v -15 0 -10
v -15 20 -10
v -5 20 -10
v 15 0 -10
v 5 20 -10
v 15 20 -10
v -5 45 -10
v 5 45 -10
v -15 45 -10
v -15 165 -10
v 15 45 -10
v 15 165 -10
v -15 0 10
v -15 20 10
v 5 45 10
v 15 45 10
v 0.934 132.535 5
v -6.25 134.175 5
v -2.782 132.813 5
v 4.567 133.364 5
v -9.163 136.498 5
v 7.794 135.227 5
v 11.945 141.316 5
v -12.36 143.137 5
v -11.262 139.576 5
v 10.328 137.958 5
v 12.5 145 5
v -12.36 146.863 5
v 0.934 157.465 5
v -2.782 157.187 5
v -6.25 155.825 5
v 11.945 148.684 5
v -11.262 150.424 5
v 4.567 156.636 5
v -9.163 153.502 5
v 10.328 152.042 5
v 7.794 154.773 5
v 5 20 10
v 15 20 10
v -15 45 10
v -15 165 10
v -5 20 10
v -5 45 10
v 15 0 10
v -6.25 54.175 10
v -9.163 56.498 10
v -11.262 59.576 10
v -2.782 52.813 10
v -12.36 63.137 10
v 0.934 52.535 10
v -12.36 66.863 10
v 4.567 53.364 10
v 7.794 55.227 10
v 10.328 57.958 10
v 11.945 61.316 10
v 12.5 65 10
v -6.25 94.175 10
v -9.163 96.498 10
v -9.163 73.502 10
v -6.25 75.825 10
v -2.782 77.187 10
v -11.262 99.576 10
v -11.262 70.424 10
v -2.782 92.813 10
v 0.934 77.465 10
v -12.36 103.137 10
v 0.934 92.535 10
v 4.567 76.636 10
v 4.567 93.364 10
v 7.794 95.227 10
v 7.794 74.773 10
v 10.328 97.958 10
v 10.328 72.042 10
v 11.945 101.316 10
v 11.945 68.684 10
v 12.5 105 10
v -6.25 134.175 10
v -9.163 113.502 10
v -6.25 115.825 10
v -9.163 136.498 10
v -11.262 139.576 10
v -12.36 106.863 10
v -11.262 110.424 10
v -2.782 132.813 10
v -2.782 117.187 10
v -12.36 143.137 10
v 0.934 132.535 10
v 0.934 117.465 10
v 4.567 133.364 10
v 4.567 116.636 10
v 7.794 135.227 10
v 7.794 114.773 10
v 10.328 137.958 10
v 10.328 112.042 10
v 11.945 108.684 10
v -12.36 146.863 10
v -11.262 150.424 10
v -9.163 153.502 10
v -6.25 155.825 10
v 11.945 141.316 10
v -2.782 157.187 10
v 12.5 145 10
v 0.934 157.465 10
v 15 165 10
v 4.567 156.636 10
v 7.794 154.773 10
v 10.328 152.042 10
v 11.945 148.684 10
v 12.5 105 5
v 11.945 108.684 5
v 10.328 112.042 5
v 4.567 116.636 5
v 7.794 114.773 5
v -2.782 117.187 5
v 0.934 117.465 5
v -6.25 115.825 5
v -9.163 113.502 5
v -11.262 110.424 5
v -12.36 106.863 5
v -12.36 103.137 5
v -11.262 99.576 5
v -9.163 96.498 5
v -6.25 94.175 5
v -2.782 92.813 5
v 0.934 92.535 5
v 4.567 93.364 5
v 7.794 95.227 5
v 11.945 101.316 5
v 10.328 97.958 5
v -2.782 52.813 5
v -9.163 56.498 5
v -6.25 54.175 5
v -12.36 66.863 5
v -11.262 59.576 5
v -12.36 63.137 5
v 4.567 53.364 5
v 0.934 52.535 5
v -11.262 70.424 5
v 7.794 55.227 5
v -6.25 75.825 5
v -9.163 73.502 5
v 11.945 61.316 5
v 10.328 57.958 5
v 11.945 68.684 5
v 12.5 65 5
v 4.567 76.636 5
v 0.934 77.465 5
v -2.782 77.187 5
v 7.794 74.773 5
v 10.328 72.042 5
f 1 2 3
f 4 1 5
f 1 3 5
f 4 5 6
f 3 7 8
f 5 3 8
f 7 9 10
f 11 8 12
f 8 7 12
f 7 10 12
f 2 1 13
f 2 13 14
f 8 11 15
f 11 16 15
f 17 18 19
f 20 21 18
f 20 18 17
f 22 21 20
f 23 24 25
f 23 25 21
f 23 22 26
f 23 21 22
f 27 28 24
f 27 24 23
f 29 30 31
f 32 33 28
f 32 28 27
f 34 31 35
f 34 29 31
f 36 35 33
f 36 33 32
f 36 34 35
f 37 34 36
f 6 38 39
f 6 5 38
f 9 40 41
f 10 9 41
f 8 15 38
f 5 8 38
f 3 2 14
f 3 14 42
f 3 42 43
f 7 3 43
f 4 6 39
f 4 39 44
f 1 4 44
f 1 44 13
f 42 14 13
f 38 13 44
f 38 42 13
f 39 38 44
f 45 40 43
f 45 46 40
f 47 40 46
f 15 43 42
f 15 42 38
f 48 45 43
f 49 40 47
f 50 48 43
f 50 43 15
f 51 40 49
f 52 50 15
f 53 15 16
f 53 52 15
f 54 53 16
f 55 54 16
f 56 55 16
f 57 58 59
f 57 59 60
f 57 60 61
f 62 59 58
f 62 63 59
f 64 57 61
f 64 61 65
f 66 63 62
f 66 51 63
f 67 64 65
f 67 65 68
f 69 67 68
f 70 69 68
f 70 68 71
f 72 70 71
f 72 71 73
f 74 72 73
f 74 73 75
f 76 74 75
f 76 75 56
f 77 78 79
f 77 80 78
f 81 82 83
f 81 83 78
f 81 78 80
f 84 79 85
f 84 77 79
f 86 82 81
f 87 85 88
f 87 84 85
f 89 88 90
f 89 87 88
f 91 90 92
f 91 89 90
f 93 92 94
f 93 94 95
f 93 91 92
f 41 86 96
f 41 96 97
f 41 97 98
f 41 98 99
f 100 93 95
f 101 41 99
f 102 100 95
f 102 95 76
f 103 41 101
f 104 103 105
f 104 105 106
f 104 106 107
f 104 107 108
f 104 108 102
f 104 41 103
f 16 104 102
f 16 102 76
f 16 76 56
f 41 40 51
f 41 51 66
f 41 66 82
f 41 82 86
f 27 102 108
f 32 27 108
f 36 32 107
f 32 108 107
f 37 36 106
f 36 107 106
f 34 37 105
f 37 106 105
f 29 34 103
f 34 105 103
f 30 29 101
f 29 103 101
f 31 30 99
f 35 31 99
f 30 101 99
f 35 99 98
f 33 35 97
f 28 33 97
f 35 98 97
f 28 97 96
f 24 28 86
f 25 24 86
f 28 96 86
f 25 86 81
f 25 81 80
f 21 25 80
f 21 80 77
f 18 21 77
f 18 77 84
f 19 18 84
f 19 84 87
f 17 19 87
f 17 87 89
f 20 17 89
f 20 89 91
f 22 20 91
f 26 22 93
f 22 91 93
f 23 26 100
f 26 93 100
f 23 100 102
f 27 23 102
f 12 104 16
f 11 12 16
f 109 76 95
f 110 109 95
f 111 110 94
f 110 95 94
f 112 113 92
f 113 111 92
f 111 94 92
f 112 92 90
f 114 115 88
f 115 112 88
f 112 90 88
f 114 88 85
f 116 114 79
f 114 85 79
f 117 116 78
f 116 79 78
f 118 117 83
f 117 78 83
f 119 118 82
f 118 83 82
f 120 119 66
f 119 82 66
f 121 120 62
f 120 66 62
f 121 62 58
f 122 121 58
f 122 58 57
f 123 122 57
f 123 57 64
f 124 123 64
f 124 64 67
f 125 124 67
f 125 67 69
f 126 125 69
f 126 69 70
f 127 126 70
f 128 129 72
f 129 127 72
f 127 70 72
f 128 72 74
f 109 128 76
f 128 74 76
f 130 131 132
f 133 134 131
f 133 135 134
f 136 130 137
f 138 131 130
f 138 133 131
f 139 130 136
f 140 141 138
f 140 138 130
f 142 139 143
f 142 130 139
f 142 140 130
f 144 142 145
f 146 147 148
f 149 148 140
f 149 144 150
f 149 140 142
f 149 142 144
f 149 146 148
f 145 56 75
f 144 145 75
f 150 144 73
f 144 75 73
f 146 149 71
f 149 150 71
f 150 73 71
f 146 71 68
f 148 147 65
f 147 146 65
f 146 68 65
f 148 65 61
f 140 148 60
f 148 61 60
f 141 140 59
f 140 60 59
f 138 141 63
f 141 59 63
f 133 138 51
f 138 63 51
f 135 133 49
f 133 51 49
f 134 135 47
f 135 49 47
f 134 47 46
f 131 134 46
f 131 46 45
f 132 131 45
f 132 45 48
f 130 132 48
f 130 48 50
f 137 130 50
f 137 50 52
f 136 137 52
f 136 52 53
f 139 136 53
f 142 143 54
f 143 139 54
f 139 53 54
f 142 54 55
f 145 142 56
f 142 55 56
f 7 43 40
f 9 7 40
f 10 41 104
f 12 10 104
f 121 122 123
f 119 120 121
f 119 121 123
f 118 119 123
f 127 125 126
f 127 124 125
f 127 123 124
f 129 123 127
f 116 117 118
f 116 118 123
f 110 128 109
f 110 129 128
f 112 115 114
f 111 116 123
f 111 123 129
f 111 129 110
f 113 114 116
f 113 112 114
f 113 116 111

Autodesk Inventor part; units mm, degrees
ref_plane "YZ Plane" through (0, 0, 0) normal (1, 0, 0) x (0, 1, 0)
ref_plane "XZ Plane" through (0, 0, 0) normal (0, 1, 0) x (-1, 0, 0)
ref_plane "XY Plane" through (0, 0, 0) normal (0, 0, 1) x (1, 0, 0)
sketch "Sketch1" plane through (0, 0, 0) normal (0, 0, 1) x (1, 0, 0)
  point P0 (0, 0)
sketch "Sketch2" plane through (0, 0, 0) normal (0, 0, 1) x (1, 0, 0)
  line L0 (-15, 20) -> (15, 20)
  line L1 (15, 20) -> (15, 0)
  line L2 (15, 0) -> (-15, 0)
  line L3 (-15, 0) -> (-15, 20)
  point P0 (0, 0)
  dimension "d0" = 30
  dimension "d1" = 20
  dimension "d2" = 20
  dimension "d3" = 15
extrude "Extrusion1" add sketch "Sketch2" along normal mid plane 20
sketch "Sketch3" plane through (0, 0, 10) normal (0, 0, 1) x (1, 0, 0)
  line L0 (-5, 45) -> (5, 45)
  line L1 (5, 45) -> (5, 20)
  line L2 (5, 20) -> (-5, 20)
  line L3 (-5, 20) -> (-5, 45)
  line L4 (15, 20) -> (-15, 20) projected
  point P0 (0, 0)
  dimension "d6" = 10
  dimension "d7" = 25
  dimension "d8" = 0
  dimension "d9" = 5
extrude "Extrusion2" add sketch "Sketch3" against normal blind 20
sketch "Sketch4" plane through (0, 0, 10) normal (0, 0, 1) x (1, 0, 0)
  line L0 (-15, 165) -> (15, 165)
  line L1 (15, 165) -> (15, 45)
  line L2 (15, 45) -> (-15, 45)
  line L3 (-15, 45) -> (-15, 165)
  line L4 (-5, 45) -> (5, 45) projected
  point P0 (0, 0)
  dimension "d12" = 30
  dimension "d13" = 120
  dimension "d14" = 0
  dimension "d15" = 15
extrude "Extrusion3" add sketch "Sketch4" against normal blind 20
sketch "Sketch5" plane through (0, 0, 10) normal (0, 0, 1) x (1, 0, 0)
  point P0 (0, 0)
sketch "Sketch6" plane through (0, 0, 10) normal (0, 0, 1) x (1, 0, 0)
  line L0 (0, 45) -> (0, 165)
  line L1 (-15, 165) -> (15, 165) projected
  line L2 (0, 165) -> (0, 125)
  line L3 (0, 125) -> (0, 85)
  line L4 (0, 85) -> (0, 45)
  line L5 (0, 165) -> (0, 145)
  line L6 (0, 125) -> (0, 105)
  line L7 (0, 85) -> (0, 65)
  line L8 (0, 165) -> (0, 145)
  circle A0 centre (0, 145) radius 12.5
  point P0 (0, 0)
  dimension "d18" = 40
  dimension "d19" = 40
  dimension "d20" = 20
  dimension "d21" = 20
  dimension "d22" = 20
  dimension "d23" = 25
extrude "Extrusion4" cut sketch "Sketch6" against normal blind 5
sketch "Sketch7" plane through (0, 0, 10) normal (0, 0, 1) x (1, 0, 0)
  line L0 (-15, 165) -> (15, 165) projected
  line L1 (0, 165) -> (0, 105)
  circle A0 centre (0, 105) radius 12.5
  point P0 (0, 0)
  dimension "d26" = 60
  dimension "d27" = 25
extrude "Extrusion5" cut sketch "Sketch7" against normal blind 5
sketch "Sketch8" plane through (0, 0, 10) normal (0, 0, 1) x (1, 0, 0)
  line L0 (0, 45) -> (0, 65)
  circle A0 centre (0, 65) radius 12.5
  point P0 (0, 0)
  dimension "d30" = 20
  dimension "d31" = 25
extrude "Extrusion6" cut sketch "Sketch8" against normal blind 5
sketch "Sketch9" plane through (15, 45, 10) normal (1, 0, 0) x (0, 0, -1)
  point P0 (10, -45)
sketch "Sketch10" plane through (0, 0, 10) normal (0, 0, 1) x (1, 0, 0)
  point P0 (0, 0)
properties part number "trafficlight"
